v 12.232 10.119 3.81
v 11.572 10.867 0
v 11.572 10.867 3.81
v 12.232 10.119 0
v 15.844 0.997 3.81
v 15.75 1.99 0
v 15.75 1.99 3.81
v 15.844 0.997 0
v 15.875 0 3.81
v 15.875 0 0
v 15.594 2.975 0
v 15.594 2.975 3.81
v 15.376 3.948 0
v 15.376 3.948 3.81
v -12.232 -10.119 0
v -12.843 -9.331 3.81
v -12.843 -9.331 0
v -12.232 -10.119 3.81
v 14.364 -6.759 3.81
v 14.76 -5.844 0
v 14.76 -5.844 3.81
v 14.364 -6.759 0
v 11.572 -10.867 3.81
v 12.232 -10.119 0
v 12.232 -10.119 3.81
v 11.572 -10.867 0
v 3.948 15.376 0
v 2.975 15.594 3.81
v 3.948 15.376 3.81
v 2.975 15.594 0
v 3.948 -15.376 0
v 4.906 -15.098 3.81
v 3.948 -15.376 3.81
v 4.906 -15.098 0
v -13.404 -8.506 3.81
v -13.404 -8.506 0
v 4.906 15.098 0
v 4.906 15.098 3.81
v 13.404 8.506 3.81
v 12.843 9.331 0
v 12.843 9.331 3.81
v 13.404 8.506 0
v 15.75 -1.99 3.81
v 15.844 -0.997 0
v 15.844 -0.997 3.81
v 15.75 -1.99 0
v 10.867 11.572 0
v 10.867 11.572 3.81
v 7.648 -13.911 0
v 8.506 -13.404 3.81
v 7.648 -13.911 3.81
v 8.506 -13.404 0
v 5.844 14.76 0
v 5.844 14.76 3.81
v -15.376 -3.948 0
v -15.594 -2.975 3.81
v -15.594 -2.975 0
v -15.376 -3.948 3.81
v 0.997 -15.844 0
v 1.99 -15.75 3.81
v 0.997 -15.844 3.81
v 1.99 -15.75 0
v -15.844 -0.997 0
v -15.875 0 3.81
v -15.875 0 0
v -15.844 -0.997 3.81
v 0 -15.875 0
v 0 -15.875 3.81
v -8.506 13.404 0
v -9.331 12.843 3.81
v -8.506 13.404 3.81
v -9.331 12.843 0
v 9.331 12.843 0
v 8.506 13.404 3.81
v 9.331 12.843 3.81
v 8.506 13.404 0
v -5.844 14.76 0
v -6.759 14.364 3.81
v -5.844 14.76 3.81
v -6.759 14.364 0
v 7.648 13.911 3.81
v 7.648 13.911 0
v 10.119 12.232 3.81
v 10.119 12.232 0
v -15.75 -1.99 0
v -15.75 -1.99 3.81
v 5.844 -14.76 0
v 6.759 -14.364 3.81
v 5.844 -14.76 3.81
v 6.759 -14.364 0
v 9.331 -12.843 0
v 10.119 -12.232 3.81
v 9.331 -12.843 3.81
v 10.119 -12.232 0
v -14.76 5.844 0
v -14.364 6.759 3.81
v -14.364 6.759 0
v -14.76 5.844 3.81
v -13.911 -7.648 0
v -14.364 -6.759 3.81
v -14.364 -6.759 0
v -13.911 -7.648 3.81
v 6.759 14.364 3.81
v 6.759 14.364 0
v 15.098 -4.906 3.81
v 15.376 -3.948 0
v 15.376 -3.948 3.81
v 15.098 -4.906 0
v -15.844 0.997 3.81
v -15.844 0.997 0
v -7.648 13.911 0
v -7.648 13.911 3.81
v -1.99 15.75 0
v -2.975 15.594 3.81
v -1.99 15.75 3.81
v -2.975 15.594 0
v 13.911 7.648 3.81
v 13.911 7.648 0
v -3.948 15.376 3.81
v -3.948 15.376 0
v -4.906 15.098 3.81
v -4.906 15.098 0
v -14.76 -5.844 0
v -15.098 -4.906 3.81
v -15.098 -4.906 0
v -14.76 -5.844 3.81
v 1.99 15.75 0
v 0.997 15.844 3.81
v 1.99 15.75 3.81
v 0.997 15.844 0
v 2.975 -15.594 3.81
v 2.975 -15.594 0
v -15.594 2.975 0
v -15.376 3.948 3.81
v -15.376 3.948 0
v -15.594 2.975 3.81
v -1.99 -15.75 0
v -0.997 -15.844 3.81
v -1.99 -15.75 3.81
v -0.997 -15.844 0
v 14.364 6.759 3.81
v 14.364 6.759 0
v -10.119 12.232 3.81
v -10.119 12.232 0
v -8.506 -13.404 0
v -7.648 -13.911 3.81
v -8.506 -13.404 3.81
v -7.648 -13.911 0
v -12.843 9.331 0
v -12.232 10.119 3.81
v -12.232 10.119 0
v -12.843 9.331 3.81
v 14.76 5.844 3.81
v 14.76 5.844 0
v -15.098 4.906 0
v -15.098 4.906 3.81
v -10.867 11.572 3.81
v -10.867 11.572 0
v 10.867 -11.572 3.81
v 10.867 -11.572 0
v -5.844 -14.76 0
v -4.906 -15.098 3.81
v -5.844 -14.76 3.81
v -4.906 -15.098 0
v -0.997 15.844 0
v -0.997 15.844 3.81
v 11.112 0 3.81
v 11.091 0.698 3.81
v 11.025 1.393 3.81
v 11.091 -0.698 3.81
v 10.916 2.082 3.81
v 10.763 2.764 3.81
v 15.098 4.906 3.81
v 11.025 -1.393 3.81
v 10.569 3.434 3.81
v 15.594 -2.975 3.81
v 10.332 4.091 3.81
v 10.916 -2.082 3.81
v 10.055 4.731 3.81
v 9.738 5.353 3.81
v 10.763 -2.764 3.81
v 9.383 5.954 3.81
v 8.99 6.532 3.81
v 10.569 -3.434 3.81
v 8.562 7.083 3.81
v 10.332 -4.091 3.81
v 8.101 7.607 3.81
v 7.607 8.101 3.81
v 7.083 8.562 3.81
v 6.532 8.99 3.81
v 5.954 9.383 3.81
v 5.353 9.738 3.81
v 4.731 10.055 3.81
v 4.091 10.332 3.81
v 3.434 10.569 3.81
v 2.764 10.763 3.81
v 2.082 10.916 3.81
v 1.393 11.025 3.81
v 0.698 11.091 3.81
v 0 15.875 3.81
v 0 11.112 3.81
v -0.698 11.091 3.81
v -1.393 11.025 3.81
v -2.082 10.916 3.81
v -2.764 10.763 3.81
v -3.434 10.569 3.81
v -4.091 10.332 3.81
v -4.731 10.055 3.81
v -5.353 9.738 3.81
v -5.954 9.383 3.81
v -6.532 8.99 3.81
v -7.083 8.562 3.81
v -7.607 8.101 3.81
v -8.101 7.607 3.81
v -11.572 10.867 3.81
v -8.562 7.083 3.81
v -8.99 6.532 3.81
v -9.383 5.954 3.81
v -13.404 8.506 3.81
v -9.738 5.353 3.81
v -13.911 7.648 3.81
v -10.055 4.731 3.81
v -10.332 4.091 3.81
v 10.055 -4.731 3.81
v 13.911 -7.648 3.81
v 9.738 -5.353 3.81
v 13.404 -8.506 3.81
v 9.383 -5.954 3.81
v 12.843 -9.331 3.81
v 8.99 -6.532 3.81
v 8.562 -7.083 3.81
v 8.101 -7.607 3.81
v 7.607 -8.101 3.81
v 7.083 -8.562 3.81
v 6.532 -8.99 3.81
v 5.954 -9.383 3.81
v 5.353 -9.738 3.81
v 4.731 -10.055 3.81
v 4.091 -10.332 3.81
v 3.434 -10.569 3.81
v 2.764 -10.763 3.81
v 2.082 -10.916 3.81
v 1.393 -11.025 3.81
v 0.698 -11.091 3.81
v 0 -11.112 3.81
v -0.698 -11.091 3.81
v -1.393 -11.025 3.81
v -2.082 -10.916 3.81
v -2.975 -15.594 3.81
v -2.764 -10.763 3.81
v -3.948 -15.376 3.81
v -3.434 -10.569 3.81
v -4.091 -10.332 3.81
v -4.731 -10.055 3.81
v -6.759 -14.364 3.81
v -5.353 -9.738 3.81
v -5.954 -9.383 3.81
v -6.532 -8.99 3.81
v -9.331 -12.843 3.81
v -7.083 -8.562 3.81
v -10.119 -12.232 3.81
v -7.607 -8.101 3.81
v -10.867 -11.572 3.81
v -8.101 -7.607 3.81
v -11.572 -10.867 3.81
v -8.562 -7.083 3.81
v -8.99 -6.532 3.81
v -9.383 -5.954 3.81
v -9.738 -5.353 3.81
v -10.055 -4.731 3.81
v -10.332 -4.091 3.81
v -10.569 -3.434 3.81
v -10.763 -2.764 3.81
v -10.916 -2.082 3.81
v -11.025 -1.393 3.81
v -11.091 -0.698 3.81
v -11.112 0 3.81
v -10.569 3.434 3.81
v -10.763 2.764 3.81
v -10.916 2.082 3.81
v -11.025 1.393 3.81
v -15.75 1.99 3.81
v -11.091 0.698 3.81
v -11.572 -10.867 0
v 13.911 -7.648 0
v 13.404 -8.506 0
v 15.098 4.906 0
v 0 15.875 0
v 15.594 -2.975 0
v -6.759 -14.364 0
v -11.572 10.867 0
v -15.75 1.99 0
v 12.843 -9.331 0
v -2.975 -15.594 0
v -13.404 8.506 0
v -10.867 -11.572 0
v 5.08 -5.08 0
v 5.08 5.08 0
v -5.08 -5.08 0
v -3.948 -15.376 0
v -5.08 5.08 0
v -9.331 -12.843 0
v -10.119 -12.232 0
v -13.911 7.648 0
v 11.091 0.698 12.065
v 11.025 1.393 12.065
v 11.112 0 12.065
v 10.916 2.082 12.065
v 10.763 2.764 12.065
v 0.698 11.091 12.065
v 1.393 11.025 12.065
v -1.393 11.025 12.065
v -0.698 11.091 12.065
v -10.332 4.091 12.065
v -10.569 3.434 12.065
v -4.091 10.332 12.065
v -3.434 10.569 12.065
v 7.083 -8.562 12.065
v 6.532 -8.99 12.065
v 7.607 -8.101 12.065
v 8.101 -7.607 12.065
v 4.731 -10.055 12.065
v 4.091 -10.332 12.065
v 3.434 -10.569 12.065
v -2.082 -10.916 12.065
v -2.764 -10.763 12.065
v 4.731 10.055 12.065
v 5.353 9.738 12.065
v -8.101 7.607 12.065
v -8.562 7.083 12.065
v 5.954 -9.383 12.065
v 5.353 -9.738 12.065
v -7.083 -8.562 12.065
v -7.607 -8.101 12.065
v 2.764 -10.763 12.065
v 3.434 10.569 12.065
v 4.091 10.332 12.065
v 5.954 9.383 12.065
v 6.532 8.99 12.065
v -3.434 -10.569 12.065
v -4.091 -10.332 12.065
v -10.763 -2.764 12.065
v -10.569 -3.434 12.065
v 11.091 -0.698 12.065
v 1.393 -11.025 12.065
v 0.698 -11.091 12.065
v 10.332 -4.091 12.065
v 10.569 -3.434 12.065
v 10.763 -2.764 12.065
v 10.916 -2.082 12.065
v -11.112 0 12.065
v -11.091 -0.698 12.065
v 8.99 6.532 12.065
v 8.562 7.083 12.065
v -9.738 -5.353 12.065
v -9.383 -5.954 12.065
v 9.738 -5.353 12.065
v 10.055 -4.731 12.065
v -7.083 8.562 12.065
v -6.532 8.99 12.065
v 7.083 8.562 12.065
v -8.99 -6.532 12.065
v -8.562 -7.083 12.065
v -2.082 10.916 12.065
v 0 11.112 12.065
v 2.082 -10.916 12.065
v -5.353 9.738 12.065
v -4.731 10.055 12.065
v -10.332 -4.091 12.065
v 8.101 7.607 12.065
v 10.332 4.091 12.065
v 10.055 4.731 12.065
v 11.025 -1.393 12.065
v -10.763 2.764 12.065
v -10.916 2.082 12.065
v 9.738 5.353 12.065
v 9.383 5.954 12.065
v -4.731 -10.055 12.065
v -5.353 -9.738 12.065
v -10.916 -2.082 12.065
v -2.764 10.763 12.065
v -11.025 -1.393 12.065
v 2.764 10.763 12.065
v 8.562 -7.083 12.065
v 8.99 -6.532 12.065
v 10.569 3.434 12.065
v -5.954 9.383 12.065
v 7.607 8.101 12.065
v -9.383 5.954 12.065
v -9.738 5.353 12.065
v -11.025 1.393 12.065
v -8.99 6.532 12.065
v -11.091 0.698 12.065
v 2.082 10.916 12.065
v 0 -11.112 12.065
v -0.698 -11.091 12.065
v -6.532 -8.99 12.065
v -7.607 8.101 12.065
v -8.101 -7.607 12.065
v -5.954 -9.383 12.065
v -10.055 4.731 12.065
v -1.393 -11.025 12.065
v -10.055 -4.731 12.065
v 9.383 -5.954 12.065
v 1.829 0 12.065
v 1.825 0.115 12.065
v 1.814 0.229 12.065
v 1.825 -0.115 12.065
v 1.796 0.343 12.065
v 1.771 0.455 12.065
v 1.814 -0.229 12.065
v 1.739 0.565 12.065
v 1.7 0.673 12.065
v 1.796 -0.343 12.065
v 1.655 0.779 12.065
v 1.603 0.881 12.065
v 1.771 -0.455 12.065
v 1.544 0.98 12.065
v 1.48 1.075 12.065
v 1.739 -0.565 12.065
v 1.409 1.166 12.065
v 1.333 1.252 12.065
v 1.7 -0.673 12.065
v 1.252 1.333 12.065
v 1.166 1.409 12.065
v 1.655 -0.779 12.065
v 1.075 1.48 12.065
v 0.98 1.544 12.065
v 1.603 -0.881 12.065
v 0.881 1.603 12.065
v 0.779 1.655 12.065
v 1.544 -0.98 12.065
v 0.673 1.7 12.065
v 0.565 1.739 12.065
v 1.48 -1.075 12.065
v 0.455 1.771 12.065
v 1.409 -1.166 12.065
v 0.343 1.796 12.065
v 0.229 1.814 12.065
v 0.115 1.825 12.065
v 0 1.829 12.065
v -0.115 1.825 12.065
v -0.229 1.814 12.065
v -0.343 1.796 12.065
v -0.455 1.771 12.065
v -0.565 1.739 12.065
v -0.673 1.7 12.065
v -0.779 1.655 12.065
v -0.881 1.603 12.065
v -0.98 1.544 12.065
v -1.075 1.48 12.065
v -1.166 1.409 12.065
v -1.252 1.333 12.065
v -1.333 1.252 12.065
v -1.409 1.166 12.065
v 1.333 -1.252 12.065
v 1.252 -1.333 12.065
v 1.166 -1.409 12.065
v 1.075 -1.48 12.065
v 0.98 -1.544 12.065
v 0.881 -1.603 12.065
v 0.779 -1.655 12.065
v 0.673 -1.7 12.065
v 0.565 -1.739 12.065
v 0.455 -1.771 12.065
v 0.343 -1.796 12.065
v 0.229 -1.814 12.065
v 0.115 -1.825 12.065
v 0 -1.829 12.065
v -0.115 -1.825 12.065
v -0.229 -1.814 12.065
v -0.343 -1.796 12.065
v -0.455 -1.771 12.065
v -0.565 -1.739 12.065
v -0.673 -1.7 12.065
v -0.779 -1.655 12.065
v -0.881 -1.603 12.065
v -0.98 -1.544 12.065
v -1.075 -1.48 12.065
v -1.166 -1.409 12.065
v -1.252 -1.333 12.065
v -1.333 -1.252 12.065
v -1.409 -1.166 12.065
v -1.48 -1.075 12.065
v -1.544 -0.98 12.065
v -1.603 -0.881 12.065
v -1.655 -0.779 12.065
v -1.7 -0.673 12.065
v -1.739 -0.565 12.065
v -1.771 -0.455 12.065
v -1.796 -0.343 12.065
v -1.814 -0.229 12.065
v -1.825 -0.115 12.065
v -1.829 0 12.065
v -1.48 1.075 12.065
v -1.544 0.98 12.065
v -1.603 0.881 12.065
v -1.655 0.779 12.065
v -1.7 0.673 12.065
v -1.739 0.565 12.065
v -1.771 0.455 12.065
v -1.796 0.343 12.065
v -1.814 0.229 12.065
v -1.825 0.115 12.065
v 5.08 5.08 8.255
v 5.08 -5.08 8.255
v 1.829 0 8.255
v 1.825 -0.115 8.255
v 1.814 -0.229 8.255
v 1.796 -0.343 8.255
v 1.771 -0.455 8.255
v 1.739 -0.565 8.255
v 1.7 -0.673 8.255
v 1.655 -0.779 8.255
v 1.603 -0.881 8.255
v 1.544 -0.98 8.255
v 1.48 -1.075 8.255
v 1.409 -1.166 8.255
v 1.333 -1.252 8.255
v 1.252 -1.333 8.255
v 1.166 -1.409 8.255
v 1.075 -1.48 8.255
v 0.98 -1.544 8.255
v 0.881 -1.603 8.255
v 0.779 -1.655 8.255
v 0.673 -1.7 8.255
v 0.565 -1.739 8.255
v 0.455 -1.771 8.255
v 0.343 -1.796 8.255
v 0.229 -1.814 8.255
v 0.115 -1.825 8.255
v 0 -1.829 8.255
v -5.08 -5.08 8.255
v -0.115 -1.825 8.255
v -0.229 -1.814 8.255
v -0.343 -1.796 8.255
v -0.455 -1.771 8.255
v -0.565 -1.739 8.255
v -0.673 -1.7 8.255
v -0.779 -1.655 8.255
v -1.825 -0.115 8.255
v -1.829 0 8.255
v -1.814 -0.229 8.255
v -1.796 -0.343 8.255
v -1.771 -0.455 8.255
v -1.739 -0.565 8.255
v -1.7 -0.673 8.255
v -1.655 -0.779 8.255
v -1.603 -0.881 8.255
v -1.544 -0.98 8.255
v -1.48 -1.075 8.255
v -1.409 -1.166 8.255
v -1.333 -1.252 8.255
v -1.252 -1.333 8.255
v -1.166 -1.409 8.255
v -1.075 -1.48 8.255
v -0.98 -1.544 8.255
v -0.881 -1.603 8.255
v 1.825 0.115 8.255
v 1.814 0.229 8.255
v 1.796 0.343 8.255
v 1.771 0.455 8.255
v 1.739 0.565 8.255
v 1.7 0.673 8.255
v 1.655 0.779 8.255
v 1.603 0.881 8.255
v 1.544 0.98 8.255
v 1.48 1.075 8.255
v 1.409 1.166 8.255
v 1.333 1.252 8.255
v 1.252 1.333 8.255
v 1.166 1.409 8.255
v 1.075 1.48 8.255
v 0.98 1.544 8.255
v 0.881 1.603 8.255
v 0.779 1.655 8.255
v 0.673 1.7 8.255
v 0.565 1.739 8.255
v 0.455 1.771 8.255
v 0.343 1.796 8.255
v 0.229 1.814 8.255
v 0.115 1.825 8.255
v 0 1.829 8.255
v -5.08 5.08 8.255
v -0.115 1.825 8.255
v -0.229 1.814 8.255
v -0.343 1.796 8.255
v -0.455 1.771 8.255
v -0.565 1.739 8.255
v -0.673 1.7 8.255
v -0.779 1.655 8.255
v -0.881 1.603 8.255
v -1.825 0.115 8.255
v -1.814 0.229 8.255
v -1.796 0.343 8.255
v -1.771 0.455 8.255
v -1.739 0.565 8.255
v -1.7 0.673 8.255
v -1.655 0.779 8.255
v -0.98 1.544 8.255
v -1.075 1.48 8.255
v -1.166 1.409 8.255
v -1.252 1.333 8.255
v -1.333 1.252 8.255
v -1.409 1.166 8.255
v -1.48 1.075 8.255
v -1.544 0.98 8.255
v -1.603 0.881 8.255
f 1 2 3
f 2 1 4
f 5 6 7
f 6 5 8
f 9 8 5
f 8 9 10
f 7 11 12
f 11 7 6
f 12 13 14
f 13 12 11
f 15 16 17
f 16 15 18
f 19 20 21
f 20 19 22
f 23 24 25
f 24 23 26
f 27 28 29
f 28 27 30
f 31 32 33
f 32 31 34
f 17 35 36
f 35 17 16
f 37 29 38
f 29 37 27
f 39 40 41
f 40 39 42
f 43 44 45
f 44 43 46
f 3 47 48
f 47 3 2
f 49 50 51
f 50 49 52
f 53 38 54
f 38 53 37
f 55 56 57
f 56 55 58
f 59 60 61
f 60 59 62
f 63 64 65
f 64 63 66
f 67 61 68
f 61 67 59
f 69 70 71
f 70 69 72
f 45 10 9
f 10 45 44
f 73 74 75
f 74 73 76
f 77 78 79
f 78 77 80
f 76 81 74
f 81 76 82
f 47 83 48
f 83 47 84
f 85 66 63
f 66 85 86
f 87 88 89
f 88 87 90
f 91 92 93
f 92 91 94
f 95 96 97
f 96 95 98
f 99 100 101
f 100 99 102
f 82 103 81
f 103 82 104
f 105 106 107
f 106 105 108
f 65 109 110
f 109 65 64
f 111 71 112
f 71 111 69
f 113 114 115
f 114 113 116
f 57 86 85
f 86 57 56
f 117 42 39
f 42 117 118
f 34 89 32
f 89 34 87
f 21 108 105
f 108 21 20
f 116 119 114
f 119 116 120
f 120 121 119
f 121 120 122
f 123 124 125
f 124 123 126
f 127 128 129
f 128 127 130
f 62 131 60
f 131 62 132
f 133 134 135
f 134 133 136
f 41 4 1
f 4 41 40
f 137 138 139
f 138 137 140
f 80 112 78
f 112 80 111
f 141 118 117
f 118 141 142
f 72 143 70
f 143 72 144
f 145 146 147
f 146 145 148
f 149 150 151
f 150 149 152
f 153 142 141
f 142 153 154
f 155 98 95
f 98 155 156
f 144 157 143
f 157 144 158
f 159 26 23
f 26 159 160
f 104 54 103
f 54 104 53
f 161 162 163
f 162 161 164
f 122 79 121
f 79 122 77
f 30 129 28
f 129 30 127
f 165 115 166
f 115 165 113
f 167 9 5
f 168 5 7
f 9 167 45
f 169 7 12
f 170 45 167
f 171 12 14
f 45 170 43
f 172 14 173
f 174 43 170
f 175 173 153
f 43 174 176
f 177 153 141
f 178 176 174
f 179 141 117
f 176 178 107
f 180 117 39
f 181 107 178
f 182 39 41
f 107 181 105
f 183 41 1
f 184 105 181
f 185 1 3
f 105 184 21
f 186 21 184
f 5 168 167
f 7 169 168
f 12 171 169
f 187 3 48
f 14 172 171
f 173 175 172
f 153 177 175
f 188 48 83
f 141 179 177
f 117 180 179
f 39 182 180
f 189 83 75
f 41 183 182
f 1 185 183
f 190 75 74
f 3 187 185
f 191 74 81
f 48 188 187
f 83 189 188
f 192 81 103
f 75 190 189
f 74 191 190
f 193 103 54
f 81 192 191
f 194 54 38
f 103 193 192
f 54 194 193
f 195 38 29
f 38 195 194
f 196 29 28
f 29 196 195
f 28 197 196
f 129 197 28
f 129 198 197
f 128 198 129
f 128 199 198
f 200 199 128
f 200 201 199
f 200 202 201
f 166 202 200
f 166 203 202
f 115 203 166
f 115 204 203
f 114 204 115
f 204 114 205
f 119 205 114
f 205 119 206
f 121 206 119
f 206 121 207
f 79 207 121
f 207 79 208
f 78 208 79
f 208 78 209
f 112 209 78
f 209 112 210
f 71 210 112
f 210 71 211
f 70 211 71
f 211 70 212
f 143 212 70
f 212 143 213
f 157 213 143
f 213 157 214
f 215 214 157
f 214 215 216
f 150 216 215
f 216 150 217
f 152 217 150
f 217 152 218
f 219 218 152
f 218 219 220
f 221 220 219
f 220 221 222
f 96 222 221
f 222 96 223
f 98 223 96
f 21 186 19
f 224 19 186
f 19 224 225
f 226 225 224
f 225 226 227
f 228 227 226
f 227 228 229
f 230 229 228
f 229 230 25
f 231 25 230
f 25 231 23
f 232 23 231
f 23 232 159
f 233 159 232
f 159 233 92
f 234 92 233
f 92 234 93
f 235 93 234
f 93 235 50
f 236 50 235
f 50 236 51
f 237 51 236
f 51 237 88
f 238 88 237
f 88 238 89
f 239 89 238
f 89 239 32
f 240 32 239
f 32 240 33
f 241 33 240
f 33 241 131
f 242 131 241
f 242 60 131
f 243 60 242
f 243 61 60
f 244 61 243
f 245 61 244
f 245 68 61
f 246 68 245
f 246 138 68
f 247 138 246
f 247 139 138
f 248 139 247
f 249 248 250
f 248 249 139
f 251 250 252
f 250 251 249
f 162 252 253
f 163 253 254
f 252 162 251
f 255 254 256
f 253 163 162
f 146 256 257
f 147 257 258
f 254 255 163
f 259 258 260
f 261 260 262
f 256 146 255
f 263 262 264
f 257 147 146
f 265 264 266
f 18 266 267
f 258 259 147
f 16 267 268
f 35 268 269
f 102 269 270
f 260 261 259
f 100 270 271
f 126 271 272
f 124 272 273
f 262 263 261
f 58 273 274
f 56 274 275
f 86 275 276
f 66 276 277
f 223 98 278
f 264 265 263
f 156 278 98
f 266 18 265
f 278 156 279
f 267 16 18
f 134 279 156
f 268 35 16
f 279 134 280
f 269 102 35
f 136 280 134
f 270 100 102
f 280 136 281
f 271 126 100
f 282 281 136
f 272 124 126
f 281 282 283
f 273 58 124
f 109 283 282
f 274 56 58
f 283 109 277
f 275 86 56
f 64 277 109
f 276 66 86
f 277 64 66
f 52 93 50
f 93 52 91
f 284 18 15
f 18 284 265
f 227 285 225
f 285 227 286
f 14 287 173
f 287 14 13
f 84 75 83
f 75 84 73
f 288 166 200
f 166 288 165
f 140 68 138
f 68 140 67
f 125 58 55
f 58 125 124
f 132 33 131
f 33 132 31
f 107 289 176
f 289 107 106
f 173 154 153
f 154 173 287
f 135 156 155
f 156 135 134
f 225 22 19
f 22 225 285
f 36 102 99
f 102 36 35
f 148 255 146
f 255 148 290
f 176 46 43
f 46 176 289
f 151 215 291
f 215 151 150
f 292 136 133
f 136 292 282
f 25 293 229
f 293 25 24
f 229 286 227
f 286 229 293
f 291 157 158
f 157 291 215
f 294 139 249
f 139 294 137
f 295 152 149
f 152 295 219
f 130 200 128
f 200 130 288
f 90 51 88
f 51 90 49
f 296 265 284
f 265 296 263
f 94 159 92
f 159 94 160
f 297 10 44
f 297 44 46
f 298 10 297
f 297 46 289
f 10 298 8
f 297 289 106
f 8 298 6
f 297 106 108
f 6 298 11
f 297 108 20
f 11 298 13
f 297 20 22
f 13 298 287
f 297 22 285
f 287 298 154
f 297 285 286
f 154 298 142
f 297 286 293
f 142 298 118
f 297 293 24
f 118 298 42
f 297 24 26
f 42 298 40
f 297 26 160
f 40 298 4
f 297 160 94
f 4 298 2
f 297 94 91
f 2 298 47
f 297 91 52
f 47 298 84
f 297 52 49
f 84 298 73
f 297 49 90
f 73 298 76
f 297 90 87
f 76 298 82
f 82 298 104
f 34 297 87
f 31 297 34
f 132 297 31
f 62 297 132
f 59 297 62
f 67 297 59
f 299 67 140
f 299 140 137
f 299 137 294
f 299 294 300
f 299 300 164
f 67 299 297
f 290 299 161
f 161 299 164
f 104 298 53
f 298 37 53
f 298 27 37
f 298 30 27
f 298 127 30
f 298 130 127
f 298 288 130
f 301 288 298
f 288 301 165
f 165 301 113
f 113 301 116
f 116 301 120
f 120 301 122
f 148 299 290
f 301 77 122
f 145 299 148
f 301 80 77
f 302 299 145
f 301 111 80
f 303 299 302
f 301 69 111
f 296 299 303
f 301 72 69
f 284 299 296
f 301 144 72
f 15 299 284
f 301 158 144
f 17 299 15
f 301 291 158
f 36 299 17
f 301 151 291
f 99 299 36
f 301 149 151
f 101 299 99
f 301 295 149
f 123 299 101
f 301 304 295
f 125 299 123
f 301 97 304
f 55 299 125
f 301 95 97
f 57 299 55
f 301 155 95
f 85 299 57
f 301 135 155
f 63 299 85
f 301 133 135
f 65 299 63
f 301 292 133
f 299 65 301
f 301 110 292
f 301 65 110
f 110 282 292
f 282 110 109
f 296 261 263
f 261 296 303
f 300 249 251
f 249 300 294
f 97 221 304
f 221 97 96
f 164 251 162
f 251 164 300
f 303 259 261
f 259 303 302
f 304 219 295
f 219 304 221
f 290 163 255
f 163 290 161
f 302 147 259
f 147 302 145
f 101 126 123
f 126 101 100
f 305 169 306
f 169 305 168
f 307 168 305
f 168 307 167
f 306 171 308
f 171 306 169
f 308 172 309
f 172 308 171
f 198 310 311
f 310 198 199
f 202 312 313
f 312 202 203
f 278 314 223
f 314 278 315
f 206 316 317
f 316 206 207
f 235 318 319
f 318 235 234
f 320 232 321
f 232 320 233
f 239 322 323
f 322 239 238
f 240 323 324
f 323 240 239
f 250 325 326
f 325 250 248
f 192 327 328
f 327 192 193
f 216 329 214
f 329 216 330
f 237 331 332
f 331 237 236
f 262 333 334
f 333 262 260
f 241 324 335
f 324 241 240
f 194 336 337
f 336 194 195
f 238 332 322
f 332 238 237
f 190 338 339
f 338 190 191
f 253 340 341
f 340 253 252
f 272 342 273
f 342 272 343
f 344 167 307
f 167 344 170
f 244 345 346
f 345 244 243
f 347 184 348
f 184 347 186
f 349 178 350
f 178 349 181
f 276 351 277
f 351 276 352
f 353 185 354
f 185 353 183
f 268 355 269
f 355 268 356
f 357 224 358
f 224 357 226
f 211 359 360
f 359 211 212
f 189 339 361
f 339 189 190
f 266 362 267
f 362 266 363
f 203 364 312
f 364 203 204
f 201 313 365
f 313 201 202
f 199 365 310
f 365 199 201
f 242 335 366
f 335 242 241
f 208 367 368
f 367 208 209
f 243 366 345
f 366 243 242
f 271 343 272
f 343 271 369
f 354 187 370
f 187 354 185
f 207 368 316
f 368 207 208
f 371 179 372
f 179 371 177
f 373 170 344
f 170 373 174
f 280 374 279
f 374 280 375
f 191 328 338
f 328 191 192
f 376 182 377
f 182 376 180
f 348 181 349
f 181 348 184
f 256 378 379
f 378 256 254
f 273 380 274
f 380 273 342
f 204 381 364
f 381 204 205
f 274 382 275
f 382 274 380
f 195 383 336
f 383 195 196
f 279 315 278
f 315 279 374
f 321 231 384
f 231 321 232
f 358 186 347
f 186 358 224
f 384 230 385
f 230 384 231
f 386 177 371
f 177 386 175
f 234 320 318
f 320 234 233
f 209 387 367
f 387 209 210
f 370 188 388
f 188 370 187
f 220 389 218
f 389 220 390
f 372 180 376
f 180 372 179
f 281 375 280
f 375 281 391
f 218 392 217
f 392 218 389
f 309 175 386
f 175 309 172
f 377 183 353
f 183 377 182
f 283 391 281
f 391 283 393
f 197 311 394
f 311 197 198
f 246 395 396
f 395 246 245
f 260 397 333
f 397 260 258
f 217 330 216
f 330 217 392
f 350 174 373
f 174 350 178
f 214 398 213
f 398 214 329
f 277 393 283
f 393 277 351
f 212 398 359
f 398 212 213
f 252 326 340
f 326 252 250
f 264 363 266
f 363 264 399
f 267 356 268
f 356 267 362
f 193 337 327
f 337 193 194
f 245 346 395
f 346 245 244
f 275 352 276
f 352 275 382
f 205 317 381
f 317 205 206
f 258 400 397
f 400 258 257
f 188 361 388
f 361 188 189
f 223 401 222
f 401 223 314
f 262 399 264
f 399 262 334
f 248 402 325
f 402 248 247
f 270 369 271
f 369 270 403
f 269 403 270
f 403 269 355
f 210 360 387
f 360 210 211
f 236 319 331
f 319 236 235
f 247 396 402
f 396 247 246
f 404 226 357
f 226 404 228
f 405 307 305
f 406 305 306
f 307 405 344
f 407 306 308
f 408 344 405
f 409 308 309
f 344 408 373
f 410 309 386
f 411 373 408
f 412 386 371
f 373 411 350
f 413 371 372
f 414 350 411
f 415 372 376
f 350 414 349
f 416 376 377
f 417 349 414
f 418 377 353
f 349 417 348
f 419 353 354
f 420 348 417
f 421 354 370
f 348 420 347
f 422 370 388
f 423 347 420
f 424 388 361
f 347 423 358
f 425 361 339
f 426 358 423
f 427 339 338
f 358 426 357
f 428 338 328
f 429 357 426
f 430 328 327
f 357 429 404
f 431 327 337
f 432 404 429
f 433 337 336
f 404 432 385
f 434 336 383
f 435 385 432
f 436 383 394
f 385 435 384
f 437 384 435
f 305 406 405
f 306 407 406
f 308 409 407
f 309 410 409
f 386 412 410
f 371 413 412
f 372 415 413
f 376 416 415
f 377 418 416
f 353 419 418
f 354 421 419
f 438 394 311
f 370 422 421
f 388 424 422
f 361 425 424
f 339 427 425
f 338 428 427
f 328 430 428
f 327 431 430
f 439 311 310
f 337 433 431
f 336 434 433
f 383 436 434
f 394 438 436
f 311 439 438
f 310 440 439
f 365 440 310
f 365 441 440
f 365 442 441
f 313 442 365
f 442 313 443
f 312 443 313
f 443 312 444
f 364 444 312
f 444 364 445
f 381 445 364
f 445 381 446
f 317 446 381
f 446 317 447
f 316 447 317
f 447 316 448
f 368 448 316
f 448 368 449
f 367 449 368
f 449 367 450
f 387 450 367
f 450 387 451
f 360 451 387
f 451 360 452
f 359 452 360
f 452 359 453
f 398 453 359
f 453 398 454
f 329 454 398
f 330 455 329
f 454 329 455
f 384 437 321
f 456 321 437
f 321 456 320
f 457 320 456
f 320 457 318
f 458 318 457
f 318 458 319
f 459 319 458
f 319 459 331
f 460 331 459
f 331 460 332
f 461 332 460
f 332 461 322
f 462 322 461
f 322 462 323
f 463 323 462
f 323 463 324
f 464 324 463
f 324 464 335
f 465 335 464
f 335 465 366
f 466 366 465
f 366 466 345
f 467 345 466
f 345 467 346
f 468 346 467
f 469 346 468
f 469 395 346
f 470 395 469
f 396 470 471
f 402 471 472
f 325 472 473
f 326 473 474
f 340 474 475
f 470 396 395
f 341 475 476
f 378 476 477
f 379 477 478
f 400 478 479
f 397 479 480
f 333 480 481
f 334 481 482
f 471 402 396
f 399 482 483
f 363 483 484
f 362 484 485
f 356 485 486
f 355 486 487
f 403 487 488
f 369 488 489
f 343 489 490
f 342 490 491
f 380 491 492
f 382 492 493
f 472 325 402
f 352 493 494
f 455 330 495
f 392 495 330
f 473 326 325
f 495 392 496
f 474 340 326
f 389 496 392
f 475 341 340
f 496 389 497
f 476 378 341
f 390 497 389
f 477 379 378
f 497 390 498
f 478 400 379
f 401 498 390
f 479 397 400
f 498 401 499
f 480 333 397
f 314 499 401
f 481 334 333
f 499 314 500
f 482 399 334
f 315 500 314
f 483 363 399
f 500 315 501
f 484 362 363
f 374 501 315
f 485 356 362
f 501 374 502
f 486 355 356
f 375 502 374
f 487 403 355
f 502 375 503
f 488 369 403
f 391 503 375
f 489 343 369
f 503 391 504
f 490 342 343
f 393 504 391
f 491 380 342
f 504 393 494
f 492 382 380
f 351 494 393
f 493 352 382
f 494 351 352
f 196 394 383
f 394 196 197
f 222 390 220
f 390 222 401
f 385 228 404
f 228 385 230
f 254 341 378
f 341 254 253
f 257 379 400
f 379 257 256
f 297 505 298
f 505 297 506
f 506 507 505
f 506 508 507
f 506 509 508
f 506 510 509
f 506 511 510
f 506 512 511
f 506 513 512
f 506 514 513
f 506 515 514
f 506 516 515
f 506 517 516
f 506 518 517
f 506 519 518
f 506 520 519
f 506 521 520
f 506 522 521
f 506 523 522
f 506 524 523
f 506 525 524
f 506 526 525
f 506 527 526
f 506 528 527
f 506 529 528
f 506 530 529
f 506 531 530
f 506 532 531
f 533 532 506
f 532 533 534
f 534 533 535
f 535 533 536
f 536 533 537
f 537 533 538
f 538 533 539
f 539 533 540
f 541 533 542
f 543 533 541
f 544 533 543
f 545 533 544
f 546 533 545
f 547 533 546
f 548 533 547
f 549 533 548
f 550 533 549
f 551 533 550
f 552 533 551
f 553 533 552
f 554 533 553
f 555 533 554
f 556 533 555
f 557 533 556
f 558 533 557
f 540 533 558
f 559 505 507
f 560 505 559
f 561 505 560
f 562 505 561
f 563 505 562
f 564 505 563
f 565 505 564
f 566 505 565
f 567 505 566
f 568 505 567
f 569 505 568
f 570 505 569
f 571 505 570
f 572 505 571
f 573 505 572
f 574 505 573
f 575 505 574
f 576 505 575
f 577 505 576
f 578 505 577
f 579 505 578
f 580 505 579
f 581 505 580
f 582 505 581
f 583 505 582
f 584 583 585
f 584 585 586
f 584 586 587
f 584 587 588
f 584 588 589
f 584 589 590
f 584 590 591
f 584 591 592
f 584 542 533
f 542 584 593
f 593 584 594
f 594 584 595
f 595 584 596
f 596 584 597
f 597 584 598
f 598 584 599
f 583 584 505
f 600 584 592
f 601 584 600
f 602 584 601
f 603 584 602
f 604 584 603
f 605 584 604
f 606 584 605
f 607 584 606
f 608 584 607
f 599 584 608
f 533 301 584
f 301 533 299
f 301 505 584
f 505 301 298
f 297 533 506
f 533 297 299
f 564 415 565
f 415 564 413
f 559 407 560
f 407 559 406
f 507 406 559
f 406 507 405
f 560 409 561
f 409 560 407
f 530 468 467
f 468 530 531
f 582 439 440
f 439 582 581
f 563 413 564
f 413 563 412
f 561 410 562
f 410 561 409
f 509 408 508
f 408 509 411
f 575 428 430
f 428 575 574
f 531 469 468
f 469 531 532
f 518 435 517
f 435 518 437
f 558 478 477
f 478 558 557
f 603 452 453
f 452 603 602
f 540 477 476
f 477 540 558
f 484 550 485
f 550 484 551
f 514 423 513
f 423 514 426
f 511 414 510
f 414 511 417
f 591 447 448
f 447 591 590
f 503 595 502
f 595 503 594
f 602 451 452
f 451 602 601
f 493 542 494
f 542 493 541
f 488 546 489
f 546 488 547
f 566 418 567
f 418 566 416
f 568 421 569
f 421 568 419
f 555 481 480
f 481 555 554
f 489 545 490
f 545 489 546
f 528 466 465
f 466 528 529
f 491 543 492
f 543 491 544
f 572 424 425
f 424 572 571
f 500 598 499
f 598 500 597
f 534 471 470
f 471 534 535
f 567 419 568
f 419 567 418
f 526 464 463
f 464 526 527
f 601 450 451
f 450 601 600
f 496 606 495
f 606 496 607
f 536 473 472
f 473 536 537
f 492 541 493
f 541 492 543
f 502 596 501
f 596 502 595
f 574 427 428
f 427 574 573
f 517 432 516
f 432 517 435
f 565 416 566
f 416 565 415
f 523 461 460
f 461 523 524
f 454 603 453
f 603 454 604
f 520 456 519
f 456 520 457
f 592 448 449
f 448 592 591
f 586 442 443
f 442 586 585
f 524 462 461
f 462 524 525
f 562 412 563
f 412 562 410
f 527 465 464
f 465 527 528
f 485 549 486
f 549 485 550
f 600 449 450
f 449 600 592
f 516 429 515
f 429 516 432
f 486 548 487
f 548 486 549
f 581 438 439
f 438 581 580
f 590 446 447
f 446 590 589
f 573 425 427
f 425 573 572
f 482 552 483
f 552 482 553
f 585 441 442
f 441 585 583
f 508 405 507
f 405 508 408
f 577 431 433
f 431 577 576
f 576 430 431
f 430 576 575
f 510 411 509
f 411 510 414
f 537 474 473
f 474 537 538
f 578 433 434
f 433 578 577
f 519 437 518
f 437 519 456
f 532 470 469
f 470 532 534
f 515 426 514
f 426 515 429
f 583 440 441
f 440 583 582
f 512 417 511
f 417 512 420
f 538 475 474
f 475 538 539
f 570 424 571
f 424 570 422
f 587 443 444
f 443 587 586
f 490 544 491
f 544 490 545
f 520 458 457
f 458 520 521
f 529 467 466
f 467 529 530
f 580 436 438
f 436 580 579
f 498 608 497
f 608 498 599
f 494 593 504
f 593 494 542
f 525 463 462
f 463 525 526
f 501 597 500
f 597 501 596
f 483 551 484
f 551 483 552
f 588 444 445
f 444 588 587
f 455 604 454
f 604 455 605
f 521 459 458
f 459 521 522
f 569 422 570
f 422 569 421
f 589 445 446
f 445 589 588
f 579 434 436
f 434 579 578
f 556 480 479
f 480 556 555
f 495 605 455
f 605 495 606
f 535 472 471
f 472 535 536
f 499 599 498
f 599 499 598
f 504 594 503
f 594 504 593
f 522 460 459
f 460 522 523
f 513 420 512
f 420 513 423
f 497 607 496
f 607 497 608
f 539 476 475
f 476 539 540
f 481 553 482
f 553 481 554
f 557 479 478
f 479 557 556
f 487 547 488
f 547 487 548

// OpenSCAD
/*
For use with 1-1/4" PVC plunger tube and 1" skirt seal.

Stretch-Fit Rotary-Shaft Ring Seal,
1" Shaft Diameter, 0.95" to 1.07" Shaft Diameter
McMaster-Carr part #9562K46

Use a fender washer for the face plate.
*/

function fromInches (i) = i * 25.4;
$fn = 100;

// Printed as 0.874 on the website but making it a nice 7/8"
uCupID = fromInches(0.875);
// Clearance close fit for #6-32 bolt
drillHoleID = fromInches(0.14400);
//Base disk OD is half way between the OD and ID of the skirt
baseDiskOD = fromInches(1.250);
shaftH = fromInches(0.325);
// Enough wall to hold the skirt seal on.
baseH = fromInches(0.150);
// Enough wall to hold the plunger head on.
drillWallH = fromInches(0.150);
totalH = shaftH + baseH;

module baseDisk () {
    cylinder(h = baseH, r = baseDiskOD / 2);
}

module shaft (h) {
    cylinder(h = h, r = uCupID / 2);
}

module drillHole (h) {
    cylinder(h = h, r = drillHoleID / 2);
}

module plungerRodHole (width, height) {
    translate ([-1*width/2,-1*width/2, 0])
        cube ([width,width,height]);
}

module plungerHead () {
    difference () {
        union () {
            baseDisk();
            translate ([0,0,baseH]) shaft(shaftH);
        }
		plungerRodHole(
            fromInches(0.4),
			totalH - drillWallH);
        drillHole(totalH);
    }
}

plungerHead();
